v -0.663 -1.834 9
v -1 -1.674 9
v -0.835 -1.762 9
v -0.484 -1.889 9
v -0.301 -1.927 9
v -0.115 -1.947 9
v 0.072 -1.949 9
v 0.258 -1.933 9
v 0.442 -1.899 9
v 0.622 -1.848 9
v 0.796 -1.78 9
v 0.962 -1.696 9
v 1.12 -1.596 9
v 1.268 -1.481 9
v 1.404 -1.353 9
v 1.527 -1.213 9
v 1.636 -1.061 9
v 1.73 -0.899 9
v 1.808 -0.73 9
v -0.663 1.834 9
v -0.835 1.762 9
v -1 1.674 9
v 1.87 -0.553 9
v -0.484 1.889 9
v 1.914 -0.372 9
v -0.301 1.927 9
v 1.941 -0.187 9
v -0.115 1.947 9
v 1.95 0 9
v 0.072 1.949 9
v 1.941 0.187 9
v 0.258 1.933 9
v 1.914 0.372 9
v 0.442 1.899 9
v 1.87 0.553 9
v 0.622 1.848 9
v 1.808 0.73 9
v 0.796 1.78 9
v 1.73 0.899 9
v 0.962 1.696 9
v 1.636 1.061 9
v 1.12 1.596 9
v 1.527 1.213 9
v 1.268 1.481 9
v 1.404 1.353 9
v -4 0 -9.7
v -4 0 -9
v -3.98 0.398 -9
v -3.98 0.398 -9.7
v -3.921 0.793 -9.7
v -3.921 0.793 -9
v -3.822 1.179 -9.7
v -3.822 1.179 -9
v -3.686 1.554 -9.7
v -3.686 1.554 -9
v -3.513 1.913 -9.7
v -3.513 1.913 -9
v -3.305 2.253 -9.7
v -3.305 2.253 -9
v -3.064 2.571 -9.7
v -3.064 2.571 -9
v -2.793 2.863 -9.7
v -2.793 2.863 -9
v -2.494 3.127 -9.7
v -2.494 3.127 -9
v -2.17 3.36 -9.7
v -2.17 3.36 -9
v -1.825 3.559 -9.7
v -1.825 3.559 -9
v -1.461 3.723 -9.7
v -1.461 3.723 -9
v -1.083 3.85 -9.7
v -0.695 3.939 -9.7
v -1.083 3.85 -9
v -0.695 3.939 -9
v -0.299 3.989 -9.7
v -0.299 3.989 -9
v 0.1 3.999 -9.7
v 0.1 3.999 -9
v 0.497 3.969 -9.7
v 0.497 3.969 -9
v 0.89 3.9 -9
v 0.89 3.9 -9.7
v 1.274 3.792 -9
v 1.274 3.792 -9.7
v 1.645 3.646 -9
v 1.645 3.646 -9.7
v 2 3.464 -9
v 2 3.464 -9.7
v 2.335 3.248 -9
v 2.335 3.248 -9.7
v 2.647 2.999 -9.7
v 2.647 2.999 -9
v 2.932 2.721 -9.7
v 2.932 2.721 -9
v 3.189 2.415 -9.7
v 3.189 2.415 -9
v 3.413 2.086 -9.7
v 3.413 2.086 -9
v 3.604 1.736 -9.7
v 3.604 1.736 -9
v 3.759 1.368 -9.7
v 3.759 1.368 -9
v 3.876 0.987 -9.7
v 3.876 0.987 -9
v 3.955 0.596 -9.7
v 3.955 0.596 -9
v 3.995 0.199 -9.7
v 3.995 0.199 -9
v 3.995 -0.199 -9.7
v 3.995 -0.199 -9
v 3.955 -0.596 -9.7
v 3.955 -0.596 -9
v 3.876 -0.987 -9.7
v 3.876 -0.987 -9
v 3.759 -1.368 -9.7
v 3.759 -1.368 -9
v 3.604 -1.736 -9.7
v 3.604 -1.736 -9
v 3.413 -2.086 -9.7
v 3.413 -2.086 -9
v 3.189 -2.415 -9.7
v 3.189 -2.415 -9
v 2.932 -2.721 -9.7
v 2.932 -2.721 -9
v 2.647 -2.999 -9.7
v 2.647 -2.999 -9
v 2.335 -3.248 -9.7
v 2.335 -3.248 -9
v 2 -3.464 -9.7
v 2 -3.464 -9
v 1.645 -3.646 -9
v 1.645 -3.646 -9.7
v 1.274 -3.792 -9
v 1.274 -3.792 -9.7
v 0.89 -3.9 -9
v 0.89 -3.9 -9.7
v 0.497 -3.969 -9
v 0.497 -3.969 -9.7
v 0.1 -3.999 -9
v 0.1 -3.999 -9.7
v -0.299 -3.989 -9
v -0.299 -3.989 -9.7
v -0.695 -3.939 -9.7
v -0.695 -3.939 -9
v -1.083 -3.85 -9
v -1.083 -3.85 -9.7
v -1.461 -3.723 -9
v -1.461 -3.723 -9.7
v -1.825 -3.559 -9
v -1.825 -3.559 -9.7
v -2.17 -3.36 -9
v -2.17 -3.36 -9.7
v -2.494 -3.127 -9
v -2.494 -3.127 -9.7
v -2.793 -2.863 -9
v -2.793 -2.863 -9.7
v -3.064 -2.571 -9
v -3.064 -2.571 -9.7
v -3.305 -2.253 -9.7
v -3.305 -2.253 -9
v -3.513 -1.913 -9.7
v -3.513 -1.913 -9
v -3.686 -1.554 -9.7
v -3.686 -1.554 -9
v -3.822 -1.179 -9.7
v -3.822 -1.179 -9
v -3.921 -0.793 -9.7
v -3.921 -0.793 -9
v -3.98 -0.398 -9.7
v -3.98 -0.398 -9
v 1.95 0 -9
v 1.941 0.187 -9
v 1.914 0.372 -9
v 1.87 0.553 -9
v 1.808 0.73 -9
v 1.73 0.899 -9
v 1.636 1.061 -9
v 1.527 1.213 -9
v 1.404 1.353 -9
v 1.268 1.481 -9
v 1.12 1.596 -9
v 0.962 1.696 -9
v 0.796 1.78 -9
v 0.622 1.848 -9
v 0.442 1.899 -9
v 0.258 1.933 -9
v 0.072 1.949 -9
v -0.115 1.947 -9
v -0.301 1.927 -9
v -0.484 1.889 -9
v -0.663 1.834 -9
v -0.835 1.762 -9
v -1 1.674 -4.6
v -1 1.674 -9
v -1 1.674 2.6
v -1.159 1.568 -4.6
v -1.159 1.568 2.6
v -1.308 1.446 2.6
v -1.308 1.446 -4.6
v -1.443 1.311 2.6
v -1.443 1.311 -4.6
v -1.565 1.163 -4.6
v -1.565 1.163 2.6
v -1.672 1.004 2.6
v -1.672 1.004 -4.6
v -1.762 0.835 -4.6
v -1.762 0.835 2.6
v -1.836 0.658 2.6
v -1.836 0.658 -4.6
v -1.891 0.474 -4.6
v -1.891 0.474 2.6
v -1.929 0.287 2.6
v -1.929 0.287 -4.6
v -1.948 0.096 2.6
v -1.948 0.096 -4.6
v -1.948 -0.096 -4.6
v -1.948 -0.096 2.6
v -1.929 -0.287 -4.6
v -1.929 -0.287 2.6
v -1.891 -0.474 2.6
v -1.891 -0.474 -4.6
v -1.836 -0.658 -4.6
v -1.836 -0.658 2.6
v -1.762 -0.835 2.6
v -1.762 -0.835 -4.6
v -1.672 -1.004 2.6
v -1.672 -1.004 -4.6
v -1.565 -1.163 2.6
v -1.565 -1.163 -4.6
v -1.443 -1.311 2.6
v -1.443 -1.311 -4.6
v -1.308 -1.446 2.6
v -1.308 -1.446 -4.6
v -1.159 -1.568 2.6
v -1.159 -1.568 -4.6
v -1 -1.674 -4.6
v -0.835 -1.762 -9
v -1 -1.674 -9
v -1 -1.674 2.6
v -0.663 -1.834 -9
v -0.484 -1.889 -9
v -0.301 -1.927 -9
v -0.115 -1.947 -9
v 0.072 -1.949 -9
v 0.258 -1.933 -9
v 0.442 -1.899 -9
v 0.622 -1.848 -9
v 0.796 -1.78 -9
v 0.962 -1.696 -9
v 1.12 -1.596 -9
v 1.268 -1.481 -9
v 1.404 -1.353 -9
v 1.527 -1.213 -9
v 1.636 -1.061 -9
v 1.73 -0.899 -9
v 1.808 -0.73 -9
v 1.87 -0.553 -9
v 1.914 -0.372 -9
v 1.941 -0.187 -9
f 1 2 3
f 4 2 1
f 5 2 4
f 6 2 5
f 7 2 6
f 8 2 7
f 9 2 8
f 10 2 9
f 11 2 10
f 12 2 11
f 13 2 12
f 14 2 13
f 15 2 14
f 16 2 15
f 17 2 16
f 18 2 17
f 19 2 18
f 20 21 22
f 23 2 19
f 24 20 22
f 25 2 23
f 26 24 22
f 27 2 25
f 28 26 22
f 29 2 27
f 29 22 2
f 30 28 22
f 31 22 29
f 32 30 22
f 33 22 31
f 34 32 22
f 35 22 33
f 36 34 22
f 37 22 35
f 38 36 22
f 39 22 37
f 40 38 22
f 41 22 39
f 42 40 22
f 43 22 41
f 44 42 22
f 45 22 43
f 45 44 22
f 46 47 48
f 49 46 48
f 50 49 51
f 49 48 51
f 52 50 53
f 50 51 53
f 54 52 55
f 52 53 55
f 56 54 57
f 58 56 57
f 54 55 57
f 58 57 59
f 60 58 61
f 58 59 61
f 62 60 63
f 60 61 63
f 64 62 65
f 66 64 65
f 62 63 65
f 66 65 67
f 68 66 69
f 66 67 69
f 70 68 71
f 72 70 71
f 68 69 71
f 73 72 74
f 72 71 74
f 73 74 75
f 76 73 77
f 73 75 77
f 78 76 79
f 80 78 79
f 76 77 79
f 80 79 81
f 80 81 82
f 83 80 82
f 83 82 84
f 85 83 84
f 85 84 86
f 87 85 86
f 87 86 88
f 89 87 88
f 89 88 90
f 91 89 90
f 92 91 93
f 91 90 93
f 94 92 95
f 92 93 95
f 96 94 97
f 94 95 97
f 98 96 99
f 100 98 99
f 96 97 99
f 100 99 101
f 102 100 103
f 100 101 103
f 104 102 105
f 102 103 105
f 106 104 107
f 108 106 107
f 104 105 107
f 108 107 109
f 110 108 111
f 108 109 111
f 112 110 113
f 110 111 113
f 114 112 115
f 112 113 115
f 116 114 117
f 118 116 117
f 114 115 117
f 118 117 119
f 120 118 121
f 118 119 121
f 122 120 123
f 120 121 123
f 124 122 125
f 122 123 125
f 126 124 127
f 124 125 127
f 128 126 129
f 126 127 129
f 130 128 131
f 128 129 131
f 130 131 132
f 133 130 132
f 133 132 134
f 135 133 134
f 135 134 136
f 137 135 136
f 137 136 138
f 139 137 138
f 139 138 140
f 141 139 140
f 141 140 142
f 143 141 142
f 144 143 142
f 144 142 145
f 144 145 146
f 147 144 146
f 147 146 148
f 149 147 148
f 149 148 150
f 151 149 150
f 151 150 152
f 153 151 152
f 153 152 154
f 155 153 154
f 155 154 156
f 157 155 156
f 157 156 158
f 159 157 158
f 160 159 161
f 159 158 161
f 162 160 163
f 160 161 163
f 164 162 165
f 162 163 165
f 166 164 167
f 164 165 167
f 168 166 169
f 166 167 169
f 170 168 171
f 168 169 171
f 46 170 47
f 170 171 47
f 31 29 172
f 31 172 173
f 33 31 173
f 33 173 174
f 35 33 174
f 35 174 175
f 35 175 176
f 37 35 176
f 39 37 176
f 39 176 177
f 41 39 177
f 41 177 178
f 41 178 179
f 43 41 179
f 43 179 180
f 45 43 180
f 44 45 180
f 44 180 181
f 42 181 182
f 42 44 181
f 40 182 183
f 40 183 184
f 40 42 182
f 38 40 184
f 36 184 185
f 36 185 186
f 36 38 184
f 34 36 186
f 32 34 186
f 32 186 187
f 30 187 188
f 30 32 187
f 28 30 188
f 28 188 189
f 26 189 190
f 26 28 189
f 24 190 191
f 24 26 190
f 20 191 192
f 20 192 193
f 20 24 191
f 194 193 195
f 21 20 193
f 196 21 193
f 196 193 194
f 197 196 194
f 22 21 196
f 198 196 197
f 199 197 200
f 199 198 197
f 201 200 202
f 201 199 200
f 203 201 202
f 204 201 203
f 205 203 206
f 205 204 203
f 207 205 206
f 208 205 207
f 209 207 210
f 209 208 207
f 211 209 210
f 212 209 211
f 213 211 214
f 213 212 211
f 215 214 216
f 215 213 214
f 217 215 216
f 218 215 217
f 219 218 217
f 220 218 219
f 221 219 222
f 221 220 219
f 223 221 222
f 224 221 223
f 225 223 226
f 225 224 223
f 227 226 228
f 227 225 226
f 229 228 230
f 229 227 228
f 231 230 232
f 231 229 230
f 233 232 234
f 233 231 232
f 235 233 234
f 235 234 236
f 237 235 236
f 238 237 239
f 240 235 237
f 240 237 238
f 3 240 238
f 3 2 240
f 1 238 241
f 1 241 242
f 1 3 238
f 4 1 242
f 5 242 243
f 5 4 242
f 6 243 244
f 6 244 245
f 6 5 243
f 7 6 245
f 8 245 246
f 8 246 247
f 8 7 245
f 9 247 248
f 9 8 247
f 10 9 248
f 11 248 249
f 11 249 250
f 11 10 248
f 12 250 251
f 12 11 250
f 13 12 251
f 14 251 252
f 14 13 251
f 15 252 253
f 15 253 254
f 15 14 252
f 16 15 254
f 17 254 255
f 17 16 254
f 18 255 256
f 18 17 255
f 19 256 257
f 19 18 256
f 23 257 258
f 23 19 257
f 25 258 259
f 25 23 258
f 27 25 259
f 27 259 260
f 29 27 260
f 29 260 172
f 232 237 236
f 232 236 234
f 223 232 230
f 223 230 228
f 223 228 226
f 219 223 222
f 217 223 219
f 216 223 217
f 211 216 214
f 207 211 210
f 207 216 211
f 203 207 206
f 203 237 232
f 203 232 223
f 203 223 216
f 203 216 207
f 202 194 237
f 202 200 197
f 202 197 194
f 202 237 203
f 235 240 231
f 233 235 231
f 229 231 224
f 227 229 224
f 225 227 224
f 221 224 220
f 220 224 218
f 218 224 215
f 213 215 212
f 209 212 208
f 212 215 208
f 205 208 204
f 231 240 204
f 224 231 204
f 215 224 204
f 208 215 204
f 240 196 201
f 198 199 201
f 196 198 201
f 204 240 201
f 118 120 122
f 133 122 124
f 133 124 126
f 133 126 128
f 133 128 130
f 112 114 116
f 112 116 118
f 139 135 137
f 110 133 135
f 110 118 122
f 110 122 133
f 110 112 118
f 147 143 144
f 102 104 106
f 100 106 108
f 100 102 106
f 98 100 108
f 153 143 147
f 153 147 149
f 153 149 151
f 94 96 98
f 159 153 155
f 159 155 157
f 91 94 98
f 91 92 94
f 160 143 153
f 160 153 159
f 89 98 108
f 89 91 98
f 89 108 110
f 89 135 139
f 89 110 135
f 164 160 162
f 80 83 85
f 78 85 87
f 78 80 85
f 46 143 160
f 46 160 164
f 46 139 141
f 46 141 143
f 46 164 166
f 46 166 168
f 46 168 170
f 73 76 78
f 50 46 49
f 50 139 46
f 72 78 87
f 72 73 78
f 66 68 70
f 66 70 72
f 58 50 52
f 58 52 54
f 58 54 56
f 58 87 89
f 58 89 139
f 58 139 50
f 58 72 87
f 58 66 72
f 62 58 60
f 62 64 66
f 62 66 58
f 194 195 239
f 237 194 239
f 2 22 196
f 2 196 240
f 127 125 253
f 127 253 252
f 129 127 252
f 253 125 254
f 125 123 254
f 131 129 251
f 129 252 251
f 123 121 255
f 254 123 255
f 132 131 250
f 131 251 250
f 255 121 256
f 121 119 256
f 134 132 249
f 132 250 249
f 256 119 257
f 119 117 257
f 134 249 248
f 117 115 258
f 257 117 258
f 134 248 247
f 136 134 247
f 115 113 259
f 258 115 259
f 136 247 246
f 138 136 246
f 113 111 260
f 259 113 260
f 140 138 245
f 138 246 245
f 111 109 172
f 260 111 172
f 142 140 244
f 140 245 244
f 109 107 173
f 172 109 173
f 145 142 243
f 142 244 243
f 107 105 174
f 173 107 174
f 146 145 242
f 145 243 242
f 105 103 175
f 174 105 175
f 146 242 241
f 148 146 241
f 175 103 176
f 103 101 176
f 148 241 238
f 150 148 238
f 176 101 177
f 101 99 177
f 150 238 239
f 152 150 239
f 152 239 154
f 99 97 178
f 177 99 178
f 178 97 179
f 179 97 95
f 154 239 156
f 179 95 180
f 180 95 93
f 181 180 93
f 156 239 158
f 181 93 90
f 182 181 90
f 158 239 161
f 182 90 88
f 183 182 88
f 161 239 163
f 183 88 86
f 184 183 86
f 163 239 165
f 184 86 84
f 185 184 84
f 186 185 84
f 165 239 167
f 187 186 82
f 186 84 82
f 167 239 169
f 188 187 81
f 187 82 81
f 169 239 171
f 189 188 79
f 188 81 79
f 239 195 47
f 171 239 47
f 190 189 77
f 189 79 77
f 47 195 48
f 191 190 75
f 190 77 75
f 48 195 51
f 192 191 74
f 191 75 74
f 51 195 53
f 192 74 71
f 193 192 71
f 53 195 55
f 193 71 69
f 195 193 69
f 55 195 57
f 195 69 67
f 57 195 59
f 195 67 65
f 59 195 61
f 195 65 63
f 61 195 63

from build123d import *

# Parameters (mm, degrees)
SKETCH2_R           = 1.95
BOSS_EXTRUDE1_DEPTH = 9
CUT_EXTRUDE1_DEPTH  = 4.4
SKETCH5_R           = 4
BOSS_EXTRUDE2_DEPTH = 0.7
CUT_EXTRUDE2_DEPTH  = 6.4


with BuildPart() as part:
    # Sketch2 → Boss-Extrude1 (new body, symmetric)
    with BuildSketch(Plane.XY):
        Circle(SKETCH2_R)
    extrude(amount=BOSS_EXTRUDE1_DEPTH, both=True)

    # Sketch4 → Cut-Extrude1 (cut)
    with BuildSketch(Plane(origin=(0, 0, -9), x_dir=(-1, 0, 0), z_dir=(0, 0, -1))):
        with BuildLine():
            Line((1, 1.674066904), (1, -1.674066904))
            ThreePointArc((1, -1.674066904), (1.95, 0), (1, 1.674066904))
        make_face()
    extrude(amount=-CUT_EXTRUDE1_DEPTH, mode=Mode.SUBTRACT)

    # Sketch5 → Boss-Extrude2 (add)
    with BuildSketch(Plane(origin=(0, 0, -9), x_dir=(-1, 0, 0), z_dir=(0, 0, -1))):
        Circle(SKETCH5_R)
    extrude(amount=BOSS_EXTRUDE2_DEPTH)

    # Sketch9 → Cut-Extrude2 (cut)
    with BuildSketch(Plane.XY.offset(9)):
        with BuildLine():
            Line((-1, 1.674066904), (-1, -1.674066904))
            ThreePointArc((-1, -1.674066904), (-1.95, 0), (-1, 1.674066904))
        make_face()
    extrude(amount=-CUT_EXTRUDE2_DEPTH, mode=Mode.SUBTRACT)


solid = part.part
